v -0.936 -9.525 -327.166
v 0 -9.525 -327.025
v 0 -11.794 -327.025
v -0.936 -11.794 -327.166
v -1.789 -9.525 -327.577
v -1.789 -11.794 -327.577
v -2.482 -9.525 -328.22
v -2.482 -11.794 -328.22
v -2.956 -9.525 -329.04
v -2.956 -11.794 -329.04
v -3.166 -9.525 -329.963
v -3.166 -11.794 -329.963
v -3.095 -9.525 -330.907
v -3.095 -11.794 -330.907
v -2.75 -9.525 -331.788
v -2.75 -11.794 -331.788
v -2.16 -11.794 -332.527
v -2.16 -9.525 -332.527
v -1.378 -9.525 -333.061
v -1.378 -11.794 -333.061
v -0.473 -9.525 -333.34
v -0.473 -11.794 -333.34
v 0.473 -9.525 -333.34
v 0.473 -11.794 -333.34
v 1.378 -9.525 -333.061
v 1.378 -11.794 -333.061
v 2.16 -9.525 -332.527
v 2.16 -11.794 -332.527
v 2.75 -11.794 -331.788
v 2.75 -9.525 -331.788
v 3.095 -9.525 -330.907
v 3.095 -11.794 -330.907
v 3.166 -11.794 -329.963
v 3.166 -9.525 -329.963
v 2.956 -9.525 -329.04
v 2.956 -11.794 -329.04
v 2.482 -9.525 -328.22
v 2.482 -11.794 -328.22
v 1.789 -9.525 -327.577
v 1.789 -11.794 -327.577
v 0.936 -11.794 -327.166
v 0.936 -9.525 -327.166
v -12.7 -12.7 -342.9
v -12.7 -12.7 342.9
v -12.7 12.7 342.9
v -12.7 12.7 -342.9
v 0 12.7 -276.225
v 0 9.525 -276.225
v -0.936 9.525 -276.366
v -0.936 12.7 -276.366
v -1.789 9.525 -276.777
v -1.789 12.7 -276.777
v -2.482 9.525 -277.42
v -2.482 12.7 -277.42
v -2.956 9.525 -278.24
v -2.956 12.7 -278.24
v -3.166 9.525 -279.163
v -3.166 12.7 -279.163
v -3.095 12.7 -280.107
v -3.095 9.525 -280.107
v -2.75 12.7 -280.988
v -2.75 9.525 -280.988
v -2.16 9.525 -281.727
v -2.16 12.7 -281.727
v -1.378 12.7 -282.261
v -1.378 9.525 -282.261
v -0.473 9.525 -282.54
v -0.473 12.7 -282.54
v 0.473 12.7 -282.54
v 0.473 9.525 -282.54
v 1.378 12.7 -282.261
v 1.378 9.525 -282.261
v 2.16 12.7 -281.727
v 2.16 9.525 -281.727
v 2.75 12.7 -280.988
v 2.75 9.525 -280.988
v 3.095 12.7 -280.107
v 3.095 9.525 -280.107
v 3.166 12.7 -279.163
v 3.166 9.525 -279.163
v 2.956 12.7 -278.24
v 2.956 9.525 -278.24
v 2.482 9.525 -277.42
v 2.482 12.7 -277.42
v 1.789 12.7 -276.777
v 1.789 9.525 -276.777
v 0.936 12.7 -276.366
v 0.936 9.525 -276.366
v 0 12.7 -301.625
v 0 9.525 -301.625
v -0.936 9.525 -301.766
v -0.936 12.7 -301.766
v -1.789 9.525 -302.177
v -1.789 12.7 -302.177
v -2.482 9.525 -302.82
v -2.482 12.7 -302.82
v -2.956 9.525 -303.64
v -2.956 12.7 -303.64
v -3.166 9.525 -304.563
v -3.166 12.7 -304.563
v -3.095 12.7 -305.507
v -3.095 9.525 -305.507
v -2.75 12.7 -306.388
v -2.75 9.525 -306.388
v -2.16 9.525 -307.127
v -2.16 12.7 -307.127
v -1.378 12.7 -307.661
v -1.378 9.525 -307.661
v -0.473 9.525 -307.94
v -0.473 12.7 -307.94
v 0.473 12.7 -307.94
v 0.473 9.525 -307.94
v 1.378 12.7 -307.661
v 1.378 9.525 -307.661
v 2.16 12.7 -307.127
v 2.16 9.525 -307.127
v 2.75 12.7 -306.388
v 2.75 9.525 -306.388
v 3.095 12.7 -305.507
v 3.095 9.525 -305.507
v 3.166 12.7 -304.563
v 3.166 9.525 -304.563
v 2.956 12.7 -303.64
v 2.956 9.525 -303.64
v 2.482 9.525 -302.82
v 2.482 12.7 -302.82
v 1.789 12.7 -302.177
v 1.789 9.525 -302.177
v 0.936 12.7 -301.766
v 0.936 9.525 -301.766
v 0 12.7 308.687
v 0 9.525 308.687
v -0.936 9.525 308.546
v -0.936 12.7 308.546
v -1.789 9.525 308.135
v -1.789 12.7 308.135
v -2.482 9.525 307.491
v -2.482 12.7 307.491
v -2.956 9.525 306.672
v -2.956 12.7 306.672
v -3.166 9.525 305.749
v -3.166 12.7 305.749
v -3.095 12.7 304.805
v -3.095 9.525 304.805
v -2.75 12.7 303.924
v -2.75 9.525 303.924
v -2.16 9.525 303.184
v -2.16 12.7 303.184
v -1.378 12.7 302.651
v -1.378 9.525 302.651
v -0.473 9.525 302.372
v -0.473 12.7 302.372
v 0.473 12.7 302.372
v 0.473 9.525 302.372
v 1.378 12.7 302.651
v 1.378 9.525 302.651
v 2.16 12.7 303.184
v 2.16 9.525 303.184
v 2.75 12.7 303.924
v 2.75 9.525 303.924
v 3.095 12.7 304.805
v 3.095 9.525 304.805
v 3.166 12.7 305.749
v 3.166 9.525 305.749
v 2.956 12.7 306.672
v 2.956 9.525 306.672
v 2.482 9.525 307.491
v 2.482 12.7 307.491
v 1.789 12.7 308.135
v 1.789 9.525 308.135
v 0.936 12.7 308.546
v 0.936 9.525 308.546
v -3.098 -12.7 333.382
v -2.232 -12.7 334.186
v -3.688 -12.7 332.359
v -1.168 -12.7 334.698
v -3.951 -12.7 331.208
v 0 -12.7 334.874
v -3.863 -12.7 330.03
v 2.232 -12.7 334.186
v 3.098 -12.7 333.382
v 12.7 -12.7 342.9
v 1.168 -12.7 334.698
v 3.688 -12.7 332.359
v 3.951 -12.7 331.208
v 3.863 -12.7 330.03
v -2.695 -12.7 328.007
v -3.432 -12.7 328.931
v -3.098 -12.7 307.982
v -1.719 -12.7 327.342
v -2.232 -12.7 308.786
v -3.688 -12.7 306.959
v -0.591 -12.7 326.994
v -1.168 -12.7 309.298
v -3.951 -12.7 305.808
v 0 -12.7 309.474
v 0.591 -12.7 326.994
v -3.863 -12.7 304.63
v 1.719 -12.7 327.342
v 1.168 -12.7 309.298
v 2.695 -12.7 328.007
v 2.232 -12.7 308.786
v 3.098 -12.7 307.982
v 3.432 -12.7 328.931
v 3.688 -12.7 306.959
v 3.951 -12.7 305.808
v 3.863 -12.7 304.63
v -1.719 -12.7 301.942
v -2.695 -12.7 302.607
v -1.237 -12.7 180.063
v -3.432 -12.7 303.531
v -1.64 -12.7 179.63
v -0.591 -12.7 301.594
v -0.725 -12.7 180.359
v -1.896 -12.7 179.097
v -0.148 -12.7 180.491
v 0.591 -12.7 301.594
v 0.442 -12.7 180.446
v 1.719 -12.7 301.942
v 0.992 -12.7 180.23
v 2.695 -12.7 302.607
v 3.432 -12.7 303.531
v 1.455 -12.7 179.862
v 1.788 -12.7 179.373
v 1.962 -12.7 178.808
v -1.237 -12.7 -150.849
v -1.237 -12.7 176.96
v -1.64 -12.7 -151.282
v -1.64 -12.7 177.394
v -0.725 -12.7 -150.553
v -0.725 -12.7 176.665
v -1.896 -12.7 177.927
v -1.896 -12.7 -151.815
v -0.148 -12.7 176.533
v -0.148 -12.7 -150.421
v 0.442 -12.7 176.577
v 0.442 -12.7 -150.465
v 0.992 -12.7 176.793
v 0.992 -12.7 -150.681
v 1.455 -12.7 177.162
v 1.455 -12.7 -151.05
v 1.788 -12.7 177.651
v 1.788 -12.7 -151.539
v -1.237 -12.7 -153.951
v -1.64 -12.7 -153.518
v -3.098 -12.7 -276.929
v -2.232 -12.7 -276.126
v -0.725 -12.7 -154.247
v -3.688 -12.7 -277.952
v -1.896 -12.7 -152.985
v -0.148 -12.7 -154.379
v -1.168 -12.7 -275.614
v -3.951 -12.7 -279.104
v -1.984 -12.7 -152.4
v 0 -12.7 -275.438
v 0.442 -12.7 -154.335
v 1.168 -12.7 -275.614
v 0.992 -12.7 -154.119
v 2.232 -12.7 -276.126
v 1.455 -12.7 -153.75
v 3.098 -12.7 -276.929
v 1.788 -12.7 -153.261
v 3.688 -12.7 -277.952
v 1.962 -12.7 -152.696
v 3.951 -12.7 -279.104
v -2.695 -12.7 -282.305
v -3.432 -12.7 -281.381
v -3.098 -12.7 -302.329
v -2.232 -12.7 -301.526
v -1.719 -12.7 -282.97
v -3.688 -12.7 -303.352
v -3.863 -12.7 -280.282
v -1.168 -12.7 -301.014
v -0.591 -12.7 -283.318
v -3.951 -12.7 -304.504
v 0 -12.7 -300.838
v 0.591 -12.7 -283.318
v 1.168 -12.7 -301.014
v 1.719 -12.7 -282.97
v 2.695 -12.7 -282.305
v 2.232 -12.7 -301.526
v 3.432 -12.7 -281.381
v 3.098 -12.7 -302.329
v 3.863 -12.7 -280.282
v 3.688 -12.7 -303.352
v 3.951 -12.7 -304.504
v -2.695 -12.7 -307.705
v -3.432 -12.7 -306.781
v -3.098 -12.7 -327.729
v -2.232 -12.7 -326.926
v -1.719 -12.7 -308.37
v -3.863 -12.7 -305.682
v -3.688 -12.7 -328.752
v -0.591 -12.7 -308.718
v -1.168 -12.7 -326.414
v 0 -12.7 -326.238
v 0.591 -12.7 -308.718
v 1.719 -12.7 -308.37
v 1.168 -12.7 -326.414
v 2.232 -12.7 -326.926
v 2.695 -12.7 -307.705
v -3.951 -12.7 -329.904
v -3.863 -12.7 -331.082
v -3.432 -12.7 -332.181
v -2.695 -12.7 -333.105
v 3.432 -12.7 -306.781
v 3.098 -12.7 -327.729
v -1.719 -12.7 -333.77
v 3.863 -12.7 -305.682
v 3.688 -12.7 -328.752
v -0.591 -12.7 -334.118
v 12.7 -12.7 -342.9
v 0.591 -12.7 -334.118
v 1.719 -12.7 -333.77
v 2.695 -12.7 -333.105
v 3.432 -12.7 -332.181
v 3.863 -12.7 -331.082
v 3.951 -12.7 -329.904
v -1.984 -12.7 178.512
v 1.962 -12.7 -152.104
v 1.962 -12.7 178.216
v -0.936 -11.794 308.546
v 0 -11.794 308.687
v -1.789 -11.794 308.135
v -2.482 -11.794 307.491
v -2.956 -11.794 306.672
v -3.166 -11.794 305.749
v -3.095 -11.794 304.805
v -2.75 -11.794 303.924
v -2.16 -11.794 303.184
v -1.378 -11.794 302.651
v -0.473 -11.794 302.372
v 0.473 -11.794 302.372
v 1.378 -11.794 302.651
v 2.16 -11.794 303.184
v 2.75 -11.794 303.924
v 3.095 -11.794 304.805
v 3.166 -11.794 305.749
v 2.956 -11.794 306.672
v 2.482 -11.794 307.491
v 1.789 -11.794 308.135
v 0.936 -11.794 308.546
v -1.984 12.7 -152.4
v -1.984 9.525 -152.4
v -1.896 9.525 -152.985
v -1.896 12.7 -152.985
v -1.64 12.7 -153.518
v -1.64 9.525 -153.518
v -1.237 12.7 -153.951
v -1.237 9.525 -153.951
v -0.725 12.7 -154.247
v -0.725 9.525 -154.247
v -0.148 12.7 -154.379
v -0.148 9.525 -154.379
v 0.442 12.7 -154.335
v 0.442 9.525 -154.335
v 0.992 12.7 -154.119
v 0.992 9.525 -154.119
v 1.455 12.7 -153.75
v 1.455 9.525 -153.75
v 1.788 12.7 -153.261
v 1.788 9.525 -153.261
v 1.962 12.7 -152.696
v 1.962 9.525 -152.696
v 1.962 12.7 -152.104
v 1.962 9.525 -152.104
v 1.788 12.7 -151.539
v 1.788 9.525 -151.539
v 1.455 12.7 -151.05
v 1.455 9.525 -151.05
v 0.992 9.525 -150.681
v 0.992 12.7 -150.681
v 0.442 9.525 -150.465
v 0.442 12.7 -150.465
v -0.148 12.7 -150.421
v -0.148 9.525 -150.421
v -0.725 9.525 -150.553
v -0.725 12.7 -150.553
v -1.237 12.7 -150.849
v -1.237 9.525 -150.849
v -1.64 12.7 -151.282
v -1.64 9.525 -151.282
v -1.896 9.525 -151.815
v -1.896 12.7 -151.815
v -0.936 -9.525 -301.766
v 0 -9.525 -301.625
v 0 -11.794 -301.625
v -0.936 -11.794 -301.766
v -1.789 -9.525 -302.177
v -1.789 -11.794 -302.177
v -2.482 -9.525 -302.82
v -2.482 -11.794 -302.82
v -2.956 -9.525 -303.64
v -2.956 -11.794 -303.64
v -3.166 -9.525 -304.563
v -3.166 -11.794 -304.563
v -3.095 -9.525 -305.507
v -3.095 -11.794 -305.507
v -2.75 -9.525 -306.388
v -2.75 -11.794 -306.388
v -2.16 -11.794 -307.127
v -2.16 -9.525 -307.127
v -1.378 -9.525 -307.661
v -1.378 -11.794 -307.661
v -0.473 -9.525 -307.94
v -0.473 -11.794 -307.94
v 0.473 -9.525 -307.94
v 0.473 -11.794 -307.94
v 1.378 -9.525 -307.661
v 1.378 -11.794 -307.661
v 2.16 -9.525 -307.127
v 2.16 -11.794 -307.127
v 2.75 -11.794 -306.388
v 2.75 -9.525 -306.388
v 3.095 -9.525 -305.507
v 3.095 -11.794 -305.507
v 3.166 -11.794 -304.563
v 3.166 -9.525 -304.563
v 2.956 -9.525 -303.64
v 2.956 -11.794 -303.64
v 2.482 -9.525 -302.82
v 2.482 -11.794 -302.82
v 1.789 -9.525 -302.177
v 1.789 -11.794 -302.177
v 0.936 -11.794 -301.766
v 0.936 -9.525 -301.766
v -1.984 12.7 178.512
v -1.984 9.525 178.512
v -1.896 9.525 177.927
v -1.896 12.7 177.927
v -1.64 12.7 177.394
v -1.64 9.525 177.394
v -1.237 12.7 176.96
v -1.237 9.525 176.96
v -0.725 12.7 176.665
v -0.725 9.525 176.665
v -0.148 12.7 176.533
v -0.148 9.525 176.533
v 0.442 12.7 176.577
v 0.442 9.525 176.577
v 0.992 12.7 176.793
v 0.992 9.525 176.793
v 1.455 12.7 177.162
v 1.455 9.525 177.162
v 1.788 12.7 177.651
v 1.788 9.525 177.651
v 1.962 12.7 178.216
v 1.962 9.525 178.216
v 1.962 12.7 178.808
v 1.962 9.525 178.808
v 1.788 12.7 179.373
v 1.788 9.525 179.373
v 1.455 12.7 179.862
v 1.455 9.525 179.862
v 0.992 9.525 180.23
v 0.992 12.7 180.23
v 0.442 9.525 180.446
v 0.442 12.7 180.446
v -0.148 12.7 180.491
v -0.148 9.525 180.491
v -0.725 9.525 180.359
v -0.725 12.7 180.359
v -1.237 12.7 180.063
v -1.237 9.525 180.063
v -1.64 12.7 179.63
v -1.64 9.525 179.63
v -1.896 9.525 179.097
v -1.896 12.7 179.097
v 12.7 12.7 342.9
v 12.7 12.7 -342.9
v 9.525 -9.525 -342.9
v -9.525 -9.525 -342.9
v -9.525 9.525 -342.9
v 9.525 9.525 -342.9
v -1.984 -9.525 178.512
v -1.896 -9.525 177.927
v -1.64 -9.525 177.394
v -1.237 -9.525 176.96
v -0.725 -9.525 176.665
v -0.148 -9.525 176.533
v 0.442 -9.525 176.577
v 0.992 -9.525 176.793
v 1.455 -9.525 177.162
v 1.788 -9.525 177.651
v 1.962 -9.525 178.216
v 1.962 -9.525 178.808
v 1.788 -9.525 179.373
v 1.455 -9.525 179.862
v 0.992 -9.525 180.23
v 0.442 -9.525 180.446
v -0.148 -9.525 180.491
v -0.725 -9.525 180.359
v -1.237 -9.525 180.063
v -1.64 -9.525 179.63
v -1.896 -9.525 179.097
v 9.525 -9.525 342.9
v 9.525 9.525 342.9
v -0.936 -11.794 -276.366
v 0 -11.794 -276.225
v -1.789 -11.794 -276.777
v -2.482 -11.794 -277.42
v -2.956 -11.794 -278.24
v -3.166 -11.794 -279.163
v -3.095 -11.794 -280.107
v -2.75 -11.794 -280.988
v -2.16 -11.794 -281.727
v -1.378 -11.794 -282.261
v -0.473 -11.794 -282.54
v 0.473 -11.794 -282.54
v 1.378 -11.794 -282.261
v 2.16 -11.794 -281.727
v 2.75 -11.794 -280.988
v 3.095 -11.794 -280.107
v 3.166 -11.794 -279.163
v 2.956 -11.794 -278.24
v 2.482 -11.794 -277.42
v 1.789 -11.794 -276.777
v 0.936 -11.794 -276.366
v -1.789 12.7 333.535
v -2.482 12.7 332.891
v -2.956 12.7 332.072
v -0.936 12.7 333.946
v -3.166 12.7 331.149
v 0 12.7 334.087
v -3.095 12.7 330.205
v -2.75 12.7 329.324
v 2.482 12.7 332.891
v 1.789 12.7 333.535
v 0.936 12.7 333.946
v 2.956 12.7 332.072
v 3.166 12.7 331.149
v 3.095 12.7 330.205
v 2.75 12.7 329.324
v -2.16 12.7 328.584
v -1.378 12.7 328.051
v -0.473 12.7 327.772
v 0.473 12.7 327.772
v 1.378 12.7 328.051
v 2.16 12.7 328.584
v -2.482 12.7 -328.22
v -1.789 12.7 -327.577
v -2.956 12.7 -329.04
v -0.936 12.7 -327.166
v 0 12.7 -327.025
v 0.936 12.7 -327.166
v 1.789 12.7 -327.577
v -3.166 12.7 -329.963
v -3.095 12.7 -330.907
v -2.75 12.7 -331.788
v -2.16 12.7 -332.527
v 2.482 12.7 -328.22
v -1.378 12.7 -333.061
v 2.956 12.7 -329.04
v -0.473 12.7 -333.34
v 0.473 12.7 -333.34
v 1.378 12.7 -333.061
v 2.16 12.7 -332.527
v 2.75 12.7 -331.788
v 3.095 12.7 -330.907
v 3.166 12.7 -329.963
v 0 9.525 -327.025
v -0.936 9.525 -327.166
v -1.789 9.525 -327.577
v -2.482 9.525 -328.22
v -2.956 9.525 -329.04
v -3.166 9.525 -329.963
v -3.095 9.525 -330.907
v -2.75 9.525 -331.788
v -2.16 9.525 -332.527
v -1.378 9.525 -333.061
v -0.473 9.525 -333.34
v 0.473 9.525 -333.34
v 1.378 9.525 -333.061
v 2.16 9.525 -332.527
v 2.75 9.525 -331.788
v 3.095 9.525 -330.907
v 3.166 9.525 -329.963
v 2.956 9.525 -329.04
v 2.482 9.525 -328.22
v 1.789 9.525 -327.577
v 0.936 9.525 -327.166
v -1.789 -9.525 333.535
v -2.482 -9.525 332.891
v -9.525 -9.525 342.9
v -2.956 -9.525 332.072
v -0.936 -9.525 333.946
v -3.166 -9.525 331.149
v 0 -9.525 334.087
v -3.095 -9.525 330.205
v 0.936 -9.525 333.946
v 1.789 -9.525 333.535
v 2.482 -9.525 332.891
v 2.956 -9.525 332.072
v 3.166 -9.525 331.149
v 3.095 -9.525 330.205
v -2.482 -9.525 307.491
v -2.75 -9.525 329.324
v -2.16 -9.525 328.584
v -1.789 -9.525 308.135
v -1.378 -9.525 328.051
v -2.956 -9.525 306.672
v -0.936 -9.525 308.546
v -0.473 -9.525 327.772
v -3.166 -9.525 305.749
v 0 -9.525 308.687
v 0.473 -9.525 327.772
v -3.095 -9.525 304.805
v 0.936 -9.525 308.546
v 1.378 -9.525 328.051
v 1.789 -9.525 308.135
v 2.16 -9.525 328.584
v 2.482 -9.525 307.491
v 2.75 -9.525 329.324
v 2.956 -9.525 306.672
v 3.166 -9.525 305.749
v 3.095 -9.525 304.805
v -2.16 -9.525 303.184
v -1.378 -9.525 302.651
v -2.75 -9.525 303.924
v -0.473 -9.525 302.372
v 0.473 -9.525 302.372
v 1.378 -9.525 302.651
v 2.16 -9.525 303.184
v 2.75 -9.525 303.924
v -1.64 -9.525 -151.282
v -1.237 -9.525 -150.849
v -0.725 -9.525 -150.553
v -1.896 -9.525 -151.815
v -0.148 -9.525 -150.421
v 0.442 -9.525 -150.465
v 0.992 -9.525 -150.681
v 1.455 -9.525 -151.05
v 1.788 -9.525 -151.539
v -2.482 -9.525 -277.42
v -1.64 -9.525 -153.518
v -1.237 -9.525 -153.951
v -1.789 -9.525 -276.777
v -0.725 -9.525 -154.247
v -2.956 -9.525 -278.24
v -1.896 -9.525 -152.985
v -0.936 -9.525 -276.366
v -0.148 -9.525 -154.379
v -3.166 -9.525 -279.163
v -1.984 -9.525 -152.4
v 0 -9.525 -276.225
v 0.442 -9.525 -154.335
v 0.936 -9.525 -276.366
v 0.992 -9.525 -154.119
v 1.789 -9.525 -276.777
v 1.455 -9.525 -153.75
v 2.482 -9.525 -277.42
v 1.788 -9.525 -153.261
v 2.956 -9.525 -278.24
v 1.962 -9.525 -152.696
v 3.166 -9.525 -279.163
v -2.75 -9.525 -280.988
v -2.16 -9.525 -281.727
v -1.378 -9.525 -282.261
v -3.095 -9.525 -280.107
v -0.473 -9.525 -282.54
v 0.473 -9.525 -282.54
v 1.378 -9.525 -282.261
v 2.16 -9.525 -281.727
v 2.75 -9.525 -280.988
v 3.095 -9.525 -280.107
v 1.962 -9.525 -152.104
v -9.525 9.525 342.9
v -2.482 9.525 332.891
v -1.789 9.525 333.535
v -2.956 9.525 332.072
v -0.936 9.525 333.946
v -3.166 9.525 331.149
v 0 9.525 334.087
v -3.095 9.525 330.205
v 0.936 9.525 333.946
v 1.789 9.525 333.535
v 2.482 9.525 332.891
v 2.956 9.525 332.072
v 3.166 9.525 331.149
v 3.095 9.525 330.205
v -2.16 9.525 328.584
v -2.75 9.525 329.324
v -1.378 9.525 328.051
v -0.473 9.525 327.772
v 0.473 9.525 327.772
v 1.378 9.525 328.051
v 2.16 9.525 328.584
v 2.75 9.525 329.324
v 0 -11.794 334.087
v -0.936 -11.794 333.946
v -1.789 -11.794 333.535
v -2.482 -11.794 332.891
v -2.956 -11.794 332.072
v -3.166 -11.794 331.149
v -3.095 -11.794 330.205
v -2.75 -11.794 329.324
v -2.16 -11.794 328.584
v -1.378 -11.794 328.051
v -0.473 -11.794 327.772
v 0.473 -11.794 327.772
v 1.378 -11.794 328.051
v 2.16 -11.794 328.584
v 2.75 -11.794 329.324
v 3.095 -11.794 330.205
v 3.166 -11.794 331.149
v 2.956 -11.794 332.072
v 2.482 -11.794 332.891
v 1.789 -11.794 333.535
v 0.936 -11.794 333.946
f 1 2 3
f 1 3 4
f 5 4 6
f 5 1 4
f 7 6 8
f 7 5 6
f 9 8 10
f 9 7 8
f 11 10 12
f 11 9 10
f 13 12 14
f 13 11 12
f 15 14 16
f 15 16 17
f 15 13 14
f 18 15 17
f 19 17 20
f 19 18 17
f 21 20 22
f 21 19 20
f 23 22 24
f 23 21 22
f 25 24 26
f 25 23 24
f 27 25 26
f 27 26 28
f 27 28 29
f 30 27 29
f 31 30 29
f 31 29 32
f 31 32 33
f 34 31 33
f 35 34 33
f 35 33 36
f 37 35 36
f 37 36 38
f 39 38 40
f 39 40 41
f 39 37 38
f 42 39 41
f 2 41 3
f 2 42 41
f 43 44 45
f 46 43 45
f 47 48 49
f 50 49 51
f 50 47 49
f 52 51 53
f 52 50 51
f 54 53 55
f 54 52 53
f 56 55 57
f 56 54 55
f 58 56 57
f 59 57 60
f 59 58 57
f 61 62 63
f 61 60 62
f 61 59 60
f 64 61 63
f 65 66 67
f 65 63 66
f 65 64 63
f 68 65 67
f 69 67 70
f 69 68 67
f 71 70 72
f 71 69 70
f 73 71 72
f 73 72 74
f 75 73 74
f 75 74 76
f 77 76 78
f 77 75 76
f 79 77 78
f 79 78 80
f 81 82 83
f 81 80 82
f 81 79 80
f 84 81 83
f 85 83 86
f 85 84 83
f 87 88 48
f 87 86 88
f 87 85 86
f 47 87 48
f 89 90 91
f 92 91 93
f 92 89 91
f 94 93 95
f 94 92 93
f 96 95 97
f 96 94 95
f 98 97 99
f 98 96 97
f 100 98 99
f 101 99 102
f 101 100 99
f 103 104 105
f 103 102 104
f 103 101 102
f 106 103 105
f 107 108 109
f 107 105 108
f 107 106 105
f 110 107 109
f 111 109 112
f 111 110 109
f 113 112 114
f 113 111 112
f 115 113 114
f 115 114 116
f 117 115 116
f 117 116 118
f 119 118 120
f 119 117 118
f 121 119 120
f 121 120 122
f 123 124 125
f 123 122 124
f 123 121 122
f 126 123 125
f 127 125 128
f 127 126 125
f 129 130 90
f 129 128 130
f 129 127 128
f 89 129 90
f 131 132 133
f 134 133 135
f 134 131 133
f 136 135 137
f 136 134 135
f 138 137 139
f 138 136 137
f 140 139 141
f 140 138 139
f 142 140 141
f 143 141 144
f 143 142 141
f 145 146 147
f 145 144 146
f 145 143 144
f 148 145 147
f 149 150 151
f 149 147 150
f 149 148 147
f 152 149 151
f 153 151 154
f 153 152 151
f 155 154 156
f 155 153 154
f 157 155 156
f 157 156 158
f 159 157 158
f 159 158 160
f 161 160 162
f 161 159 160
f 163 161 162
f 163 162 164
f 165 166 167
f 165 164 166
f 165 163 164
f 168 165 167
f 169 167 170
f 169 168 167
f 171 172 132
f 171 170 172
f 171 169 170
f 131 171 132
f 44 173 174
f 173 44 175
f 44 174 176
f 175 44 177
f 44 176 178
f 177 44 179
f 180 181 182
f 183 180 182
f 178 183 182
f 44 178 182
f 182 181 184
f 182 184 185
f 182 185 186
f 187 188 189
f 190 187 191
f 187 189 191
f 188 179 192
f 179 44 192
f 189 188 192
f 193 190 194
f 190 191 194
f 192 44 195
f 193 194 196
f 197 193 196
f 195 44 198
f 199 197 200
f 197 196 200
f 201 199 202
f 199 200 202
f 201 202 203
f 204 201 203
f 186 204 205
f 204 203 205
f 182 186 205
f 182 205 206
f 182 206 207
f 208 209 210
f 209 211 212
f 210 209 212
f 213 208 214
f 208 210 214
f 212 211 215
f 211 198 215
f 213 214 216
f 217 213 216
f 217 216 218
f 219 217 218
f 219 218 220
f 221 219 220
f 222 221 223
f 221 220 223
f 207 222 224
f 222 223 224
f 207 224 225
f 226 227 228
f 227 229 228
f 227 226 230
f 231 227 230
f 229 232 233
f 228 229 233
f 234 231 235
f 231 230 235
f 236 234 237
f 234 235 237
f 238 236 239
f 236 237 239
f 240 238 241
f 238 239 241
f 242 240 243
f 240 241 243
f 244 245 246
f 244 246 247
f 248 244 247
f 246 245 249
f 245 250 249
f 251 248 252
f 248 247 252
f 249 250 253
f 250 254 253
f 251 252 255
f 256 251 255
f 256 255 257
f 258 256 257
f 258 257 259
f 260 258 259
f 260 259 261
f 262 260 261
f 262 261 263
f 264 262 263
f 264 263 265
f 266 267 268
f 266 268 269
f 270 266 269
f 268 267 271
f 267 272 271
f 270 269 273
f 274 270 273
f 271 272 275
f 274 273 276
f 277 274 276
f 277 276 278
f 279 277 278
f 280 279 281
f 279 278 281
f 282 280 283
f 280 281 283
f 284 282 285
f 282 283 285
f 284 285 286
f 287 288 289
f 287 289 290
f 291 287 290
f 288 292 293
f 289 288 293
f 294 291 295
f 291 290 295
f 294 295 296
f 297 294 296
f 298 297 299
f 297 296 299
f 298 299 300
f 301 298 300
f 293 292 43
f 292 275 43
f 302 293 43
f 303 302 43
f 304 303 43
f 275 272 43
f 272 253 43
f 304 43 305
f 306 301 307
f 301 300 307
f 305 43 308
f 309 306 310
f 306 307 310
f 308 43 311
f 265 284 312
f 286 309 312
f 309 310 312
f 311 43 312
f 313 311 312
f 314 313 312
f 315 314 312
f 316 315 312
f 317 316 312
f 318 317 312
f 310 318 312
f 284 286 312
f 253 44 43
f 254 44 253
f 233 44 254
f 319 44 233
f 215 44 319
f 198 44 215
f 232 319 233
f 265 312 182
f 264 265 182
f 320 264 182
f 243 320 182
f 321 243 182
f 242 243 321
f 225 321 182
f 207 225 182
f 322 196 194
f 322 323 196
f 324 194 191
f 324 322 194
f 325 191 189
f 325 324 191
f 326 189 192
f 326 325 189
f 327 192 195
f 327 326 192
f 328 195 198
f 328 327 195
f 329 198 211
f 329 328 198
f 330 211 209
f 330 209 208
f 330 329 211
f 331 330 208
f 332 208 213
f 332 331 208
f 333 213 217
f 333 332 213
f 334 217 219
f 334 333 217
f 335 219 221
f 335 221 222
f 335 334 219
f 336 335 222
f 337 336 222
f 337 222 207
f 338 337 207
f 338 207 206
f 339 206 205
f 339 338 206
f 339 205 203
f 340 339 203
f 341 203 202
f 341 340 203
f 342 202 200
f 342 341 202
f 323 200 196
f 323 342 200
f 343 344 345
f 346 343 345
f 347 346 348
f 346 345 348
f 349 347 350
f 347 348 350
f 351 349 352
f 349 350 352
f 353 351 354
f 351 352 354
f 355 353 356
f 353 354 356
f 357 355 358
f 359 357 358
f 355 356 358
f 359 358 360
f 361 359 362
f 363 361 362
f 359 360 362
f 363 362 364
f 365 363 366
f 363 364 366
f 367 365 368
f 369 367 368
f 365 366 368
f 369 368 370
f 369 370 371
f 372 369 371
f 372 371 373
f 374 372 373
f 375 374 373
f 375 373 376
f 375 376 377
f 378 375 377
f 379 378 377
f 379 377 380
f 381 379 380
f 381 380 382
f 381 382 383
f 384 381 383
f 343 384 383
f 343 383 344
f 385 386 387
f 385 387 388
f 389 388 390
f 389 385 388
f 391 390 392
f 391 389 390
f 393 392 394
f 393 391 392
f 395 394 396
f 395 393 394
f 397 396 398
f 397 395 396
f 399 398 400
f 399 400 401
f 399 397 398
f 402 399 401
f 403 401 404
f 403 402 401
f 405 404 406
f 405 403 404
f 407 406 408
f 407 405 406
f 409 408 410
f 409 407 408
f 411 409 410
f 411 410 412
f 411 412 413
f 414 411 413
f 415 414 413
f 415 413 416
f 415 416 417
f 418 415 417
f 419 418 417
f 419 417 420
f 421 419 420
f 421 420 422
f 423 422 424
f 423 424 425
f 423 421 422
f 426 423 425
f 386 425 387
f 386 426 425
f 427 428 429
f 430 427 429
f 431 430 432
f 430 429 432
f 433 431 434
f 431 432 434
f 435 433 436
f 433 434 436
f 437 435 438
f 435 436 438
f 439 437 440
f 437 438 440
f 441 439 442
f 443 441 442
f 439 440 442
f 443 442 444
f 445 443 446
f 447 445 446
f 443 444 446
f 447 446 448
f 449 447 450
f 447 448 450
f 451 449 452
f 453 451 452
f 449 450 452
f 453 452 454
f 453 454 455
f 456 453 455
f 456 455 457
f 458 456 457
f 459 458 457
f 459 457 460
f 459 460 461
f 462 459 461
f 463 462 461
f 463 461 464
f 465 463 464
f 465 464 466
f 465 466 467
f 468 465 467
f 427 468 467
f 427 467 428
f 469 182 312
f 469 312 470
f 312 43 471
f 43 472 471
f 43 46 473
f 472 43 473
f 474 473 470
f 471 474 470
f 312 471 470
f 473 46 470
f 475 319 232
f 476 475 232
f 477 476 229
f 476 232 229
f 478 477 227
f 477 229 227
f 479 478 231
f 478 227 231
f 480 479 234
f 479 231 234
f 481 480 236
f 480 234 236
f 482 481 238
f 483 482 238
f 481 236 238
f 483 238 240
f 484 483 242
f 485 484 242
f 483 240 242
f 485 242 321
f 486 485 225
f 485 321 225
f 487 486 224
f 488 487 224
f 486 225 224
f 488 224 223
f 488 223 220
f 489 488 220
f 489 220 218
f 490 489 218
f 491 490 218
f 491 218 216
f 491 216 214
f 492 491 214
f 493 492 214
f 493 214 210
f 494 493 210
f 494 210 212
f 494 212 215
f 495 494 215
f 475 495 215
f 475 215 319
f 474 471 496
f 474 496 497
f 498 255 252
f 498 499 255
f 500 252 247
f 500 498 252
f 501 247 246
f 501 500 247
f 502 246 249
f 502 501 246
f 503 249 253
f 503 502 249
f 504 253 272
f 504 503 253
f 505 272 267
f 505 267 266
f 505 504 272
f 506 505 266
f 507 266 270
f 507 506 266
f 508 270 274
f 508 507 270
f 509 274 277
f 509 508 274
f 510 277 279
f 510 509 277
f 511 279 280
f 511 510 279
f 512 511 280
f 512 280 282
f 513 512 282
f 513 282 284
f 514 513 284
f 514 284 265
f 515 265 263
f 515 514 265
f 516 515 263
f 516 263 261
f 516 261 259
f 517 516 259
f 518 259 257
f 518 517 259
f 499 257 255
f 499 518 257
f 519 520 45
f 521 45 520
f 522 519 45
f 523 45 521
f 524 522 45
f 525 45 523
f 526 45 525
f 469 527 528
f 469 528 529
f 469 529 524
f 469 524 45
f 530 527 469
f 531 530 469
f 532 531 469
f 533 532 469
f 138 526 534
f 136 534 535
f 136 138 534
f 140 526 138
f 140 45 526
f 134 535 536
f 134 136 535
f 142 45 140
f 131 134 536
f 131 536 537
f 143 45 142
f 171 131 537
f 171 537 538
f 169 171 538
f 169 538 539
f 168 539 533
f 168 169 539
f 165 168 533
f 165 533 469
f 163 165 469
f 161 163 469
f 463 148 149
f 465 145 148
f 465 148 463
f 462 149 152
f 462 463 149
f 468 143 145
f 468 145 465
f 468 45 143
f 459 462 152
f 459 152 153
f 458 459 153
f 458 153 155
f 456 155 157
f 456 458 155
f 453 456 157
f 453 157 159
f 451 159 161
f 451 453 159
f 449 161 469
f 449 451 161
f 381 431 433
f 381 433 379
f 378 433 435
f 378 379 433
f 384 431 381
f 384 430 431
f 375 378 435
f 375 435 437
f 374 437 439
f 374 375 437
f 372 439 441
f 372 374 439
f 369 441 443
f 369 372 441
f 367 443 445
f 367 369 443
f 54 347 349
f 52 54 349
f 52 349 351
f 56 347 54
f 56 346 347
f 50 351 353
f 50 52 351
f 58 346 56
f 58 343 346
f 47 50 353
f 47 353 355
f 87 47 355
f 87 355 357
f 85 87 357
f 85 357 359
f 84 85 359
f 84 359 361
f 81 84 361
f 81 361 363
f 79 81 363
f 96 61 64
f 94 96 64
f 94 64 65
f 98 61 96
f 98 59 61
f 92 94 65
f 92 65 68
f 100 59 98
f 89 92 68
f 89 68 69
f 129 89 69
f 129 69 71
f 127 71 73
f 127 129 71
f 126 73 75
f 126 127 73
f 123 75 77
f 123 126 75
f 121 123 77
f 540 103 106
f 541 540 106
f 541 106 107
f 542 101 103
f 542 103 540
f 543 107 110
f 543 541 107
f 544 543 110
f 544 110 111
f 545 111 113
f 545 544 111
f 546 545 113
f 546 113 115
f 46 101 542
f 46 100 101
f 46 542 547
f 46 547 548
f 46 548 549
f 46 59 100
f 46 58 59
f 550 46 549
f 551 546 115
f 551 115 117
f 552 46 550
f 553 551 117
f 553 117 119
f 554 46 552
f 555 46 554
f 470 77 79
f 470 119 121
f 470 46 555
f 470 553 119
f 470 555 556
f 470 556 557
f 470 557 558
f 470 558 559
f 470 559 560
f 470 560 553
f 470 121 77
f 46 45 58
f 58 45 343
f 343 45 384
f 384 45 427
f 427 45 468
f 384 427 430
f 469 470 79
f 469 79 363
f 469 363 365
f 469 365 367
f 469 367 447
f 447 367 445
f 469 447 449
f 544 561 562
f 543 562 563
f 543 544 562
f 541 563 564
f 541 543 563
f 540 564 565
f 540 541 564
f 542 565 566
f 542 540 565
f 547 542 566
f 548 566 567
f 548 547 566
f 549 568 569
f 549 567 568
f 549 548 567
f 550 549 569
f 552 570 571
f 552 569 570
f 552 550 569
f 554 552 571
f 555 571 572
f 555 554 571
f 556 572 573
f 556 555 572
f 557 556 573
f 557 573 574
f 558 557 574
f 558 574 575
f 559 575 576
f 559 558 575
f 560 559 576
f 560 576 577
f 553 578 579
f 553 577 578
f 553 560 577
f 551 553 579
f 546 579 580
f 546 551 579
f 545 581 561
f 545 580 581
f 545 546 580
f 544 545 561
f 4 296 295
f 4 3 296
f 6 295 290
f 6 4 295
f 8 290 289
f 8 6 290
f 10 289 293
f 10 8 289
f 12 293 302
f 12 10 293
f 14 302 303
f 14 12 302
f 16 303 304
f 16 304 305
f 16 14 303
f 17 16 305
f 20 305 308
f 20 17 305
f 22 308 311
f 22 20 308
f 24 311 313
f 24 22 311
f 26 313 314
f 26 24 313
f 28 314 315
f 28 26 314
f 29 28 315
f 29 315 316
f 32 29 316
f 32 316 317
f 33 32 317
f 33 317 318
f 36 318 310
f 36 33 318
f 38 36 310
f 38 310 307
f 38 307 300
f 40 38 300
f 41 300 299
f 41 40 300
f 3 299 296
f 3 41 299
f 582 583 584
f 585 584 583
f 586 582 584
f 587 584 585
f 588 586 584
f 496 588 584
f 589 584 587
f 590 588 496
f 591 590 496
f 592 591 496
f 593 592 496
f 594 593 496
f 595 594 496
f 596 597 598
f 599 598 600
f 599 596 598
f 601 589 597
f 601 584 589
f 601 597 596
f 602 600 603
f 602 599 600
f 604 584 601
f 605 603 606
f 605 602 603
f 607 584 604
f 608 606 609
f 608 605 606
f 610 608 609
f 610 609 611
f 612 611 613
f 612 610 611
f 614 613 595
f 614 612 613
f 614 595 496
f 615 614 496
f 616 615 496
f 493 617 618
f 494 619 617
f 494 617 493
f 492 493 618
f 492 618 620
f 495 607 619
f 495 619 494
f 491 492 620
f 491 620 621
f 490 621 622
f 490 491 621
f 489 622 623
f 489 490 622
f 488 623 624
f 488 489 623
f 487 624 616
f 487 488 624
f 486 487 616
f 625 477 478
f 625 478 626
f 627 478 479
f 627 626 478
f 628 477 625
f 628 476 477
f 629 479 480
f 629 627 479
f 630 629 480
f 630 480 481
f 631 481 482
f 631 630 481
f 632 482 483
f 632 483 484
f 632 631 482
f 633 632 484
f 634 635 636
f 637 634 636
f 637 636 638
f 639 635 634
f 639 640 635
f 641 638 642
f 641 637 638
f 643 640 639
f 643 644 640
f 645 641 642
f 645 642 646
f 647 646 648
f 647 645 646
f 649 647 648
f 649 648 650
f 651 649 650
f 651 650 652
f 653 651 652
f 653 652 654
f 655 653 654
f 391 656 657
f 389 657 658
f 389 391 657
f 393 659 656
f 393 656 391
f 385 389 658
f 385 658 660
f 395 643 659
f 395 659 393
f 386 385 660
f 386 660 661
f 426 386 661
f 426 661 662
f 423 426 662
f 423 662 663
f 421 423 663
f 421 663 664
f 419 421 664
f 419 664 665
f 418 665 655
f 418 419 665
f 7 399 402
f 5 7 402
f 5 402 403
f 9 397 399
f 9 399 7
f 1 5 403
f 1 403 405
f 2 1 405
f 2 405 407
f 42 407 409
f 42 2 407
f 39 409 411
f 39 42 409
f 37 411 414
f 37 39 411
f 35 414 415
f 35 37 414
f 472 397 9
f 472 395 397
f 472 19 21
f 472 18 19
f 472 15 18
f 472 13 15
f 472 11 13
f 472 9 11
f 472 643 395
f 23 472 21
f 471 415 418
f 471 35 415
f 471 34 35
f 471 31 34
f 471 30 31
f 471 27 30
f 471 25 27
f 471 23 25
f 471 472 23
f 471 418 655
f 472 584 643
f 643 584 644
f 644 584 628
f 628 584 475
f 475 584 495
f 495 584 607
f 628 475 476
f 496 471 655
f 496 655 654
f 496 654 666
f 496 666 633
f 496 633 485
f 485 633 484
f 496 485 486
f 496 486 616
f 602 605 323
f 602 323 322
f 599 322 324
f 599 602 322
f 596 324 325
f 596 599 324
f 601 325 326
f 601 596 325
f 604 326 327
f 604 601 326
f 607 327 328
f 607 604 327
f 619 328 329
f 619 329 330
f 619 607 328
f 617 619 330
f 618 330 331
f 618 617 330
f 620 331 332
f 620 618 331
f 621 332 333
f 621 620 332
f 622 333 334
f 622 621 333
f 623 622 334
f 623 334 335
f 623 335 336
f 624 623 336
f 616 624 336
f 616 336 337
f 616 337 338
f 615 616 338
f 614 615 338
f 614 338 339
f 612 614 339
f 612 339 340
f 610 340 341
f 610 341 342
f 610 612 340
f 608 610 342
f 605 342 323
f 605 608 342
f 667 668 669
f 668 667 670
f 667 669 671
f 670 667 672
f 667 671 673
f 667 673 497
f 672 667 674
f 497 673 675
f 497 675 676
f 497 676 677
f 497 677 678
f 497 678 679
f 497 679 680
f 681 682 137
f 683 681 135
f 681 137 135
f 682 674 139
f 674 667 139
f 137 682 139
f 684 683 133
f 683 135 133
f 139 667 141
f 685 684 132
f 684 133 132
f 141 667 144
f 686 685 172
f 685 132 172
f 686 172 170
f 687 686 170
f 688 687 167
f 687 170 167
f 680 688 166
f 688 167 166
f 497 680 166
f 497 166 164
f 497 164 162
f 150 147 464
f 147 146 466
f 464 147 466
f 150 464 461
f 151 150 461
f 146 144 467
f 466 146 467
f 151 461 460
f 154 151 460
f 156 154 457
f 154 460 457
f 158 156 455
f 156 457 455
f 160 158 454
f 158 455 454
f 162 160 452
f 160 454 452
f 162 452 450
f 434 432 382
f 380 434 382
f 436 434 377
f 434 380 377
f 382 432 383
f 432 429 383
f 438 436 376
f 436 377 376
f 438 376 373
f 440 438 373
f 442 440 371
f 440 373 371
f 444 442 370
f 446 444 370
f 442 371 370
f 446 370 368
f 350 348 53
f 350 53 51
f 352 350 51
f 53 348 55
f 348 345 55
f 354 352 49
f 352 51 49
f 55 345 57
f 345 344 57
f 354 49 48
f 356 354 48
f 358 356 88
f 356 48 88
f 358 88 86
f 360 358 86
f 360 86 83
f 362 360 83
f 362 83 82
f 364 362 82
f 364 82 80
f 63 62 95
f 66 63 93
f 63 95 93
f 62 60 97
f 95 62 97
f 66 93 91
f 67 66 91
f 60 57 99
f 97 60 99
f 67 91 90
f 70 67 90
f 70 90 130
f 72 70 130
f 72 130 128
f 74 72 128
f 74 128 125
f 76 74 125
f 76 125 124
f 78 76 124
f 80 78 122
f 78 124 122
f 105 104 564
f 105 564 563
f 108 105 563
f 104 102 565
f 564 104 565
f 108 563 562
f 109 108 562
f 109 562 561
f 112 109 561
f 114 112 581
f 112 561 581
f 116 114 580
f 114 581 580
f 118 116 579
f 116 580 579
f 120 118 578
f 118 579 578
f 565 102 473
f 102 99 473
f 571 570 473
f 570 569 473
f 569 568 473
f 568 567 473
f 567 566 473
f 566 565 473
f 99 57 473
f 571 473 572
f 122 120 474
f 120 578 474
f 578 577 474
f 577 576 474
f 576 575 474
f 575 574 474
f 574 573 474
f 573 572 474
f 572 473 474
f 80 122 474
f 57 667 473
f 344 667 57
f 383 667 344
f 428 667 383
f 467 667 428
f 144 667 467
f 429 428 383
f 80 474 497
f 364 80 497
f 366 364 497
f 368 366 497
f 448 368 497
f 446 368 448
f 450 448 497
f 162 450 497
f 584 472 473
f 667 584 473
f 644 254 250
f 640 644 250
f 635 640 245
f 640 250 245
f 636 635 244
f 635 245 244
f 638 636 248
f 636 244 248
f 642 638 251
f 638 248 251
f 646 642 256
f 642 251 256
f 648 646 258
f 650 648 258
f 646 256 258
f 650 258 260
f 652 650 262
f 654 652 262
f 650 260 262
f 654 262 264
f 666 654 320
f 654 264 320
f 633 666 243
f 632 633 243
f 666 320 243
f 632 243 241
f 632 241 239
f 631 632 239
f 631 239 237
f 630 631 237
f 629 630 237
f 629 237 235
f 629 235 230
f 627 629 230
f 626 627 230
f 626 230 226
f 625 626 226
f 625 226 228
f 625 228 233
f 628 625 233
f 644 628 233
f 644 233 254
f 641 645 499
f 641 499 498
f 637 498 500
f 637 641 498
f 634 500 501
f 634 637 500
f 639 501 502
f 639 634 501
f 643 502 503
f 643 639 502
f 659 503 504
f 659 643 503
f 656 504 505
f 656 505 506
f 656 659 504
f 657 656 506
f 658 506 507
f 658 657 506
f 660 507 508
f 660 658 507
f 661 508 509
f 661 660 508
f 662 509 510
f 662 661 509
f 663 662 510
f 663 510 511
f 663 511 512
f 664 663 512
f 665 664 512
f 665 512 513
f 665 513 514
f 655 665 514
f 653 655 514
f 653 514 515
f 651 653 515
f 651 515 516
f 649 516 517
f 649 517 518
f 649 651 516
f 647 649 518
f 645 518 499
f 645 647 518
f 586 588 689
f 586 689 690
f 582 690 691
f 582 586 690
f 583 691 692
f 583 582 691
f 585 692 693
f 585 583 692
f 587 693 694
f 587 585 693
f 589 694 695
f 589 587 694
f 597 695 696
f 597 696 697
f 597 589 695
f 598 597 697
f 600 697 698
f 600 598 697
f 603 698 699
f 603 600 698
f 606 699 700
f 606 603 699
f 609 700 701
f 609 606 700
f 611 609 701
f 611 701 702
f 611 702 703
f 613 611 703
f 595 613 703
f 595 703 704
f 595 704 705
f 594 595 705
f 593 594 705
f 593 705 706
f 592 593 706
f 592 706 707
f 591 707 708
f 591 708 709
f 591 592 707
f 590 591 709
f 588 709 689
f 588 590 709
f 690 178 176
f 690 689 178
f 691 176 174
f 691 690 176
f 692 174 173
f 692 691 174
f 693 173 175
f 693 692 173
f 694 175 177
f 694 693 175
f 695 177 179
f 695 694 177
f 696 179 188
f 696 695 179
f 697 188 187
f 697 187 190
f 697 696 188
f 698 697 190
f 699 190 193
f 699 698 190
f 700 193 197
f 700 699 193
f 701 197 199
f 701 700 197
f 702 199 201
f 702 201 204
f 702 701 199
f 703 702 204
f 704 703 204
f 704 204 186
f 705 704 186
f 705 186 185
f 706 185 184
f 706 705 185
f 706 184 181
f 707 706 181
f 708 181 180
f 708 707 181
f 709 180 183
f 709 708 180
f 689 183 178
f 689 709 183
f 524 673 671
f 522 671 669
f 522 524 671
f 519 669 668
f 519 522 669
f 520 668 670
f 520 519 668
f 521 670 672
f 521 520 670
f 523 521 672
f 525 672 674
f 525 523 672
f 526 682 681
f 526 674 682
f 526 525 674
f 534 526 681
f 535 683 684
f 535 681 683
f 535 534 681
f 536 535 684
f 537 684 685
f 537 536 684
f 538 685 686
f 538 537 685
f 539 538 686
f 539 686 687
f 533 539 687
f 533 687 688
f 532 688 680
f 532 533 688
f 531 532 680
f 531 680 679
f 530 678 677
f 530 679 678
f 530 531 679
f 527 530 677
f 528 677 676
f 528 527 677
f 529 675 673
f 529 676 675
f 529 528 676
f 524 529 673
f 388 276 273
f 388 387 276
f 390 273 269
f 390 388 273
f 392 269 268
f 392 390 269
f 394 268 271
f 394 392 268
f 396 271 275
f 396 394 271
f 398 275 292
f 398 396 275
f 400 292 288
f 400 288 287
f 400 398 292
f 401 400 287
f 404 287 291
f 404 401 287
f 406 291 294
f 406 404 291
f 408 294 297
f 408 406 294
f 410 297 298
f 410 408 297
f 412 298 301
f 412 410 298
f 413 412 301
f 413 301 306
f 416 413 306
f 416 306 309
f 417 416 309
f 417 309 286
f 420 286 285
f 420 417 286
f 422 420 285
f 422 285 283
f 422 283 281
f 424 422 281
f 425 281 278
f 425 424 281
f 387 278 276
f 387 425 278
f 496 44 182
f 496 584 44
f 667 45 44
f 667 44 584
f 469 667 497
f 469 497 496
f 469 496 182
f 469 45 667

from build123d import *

# Parameters (mm, degrees)
BOSS_EXTRUDE1_DEPTH                  = 342.9
BOSS_EXTRUDE1_DEPTH_BACK             = 342.9
SKETCH3_W                            = 25.4
SKETCH3_H                            = 25.4
SKETCH3_W_2                          = 19.05
SKETCH3_H_2                          = 19.05
F_5_32_0_15625_DIAMETER_HOLE1_D      = 3.96875
F_1_4_0_25_DIAMETER_HOLE1_AT_2_COUNT = 2
F_1_4_0_25_DIAMETER_HOLE1_AT_2_PITCH = 25.4
F_1_4_0_25_DIAMETER_HOLE1_AT_3_COUNT = 2
F_1_4_0_25_DIAMETER_HOLE1_AT_3_PITCH = 50.8
F_1_4_0_25_DIAMETER_HOLE2_AT_2_COUNT = 2
F_1_4_0_25_DIAMETER_HOLE2_AT_2_PITCH = 25.4


with BuildPart() as part:
    # Sketch3 → Boss-Extrude1 (new, two sides: drawn at the far end of the back side and taken through both)
    with BuildSketch(Plane.XY.offset(-BOSS_EXTRUDE1_DEPTH_BACK)):
        Rectangle(SKETCH3_W, SKETCH3_H)
        Rectangle(SKETCH3_W_2, SKETCH3_H_2, mode=Mode.SUBTRACT)
    extrude(amount=BOSS_EXTRUDE1_DEPTH + BOSS_EXTRUDE1_DEPTH_BACK)

    # 5/32 (0.15625) Diameter Hole1 (through all)
    with Locations(Plane(origin=(0, 12.7, 0), x_dir=(1, 0, 0), z_dir=(0, 1, 0))):
        with Locations((0, 152.4), (0, -178.5118096)):
            Hole(F_5_32_0_15625_DIAMETER_HOLE1_D / 2)

    # Sketch9 → 1/4 (0.25) Diameter Hole1 (revolve, cut)
    with BuildSketch(Plane(origin=(0, 12.7, -330.2), x_dir=(0, 0, 1), z_dir=(1, 0, 0))):
        Polygon((0, 0), (0, 25.4), (3.9624, 25.4), (3.175, 24.494199916), (3.175, 0), align=None)
    f_1_4_0_25_diameter_hole1 = revolve(axis=Axis((0, 19.05, -330.2), (0, -1, 0)), mode=Mode.SUBTRACT)

    # 1/4 (0.25) Diameter Hole1 at 2: 1/4 (0.25) Diameter Hole1 ×2
    with Locations(*[(0, 0, i * F_1_4_0_25_DIAMETER_HOLE1_AT_2_PITCH) for i in range(1, F_1_4_0_25_DIAMETER_HOLE1_AT_2_COUNT)]):
        add(f_1_4_0_25_diameter_hole1, mode=Mode.SUBTRACT)

    # 1/4 (0.25) Diameter Hole1 at 3: 1/4 (0.25) Diameter Hole1 ×2
    with Locations(*[(0, 0, i * F_1_4_0_25_DIAMETER_HOLE1_AT_3_PITCH) for i in range(1, F_1_4_0_25_DIAMETER_HOLE1_AT_3_COUNT)]):
        add(f_1_4_0_25_diameter_hole1, mode=Mode.SUBTRACT)

    # Sketch12 → 1/4 (0.25) Diameter Hole2 (revolve, cut)
    with BuildSketch(Plane(origin=(0, 12.7, 330.911799988), x_dir=(0, 0, 1), z_dir=(1, 0, 0))):
        Polygon((0, 0), (0, 25.4), (3.9624, 25.4), (3.175, 24.494199916), (3.175, 0), align=None)
    f_1_4_0_25_diameter_hole2 = revolve(axis=Axis((0, 19.05, 330.911799988), (0, -1, 0)), mode=Mode.SUBTRACT)

    # 1/4 (0.25) Diameter Hole2 at 2: 1/4 (0.25) Diameter Hole2 ×2
    with Locations(*[(0, 0, -i * F_1_4_0_25_DIAMETER_HOLE2_AT_2_PITCH) for i in range(1, F_1_4_0_25_DIAMETER_HOLE2_AT_2_COUNT)]):
        add(f_1_4_0_25_diameter_hole2, mode=Mode.SUBTRACT)


solid = part.part
